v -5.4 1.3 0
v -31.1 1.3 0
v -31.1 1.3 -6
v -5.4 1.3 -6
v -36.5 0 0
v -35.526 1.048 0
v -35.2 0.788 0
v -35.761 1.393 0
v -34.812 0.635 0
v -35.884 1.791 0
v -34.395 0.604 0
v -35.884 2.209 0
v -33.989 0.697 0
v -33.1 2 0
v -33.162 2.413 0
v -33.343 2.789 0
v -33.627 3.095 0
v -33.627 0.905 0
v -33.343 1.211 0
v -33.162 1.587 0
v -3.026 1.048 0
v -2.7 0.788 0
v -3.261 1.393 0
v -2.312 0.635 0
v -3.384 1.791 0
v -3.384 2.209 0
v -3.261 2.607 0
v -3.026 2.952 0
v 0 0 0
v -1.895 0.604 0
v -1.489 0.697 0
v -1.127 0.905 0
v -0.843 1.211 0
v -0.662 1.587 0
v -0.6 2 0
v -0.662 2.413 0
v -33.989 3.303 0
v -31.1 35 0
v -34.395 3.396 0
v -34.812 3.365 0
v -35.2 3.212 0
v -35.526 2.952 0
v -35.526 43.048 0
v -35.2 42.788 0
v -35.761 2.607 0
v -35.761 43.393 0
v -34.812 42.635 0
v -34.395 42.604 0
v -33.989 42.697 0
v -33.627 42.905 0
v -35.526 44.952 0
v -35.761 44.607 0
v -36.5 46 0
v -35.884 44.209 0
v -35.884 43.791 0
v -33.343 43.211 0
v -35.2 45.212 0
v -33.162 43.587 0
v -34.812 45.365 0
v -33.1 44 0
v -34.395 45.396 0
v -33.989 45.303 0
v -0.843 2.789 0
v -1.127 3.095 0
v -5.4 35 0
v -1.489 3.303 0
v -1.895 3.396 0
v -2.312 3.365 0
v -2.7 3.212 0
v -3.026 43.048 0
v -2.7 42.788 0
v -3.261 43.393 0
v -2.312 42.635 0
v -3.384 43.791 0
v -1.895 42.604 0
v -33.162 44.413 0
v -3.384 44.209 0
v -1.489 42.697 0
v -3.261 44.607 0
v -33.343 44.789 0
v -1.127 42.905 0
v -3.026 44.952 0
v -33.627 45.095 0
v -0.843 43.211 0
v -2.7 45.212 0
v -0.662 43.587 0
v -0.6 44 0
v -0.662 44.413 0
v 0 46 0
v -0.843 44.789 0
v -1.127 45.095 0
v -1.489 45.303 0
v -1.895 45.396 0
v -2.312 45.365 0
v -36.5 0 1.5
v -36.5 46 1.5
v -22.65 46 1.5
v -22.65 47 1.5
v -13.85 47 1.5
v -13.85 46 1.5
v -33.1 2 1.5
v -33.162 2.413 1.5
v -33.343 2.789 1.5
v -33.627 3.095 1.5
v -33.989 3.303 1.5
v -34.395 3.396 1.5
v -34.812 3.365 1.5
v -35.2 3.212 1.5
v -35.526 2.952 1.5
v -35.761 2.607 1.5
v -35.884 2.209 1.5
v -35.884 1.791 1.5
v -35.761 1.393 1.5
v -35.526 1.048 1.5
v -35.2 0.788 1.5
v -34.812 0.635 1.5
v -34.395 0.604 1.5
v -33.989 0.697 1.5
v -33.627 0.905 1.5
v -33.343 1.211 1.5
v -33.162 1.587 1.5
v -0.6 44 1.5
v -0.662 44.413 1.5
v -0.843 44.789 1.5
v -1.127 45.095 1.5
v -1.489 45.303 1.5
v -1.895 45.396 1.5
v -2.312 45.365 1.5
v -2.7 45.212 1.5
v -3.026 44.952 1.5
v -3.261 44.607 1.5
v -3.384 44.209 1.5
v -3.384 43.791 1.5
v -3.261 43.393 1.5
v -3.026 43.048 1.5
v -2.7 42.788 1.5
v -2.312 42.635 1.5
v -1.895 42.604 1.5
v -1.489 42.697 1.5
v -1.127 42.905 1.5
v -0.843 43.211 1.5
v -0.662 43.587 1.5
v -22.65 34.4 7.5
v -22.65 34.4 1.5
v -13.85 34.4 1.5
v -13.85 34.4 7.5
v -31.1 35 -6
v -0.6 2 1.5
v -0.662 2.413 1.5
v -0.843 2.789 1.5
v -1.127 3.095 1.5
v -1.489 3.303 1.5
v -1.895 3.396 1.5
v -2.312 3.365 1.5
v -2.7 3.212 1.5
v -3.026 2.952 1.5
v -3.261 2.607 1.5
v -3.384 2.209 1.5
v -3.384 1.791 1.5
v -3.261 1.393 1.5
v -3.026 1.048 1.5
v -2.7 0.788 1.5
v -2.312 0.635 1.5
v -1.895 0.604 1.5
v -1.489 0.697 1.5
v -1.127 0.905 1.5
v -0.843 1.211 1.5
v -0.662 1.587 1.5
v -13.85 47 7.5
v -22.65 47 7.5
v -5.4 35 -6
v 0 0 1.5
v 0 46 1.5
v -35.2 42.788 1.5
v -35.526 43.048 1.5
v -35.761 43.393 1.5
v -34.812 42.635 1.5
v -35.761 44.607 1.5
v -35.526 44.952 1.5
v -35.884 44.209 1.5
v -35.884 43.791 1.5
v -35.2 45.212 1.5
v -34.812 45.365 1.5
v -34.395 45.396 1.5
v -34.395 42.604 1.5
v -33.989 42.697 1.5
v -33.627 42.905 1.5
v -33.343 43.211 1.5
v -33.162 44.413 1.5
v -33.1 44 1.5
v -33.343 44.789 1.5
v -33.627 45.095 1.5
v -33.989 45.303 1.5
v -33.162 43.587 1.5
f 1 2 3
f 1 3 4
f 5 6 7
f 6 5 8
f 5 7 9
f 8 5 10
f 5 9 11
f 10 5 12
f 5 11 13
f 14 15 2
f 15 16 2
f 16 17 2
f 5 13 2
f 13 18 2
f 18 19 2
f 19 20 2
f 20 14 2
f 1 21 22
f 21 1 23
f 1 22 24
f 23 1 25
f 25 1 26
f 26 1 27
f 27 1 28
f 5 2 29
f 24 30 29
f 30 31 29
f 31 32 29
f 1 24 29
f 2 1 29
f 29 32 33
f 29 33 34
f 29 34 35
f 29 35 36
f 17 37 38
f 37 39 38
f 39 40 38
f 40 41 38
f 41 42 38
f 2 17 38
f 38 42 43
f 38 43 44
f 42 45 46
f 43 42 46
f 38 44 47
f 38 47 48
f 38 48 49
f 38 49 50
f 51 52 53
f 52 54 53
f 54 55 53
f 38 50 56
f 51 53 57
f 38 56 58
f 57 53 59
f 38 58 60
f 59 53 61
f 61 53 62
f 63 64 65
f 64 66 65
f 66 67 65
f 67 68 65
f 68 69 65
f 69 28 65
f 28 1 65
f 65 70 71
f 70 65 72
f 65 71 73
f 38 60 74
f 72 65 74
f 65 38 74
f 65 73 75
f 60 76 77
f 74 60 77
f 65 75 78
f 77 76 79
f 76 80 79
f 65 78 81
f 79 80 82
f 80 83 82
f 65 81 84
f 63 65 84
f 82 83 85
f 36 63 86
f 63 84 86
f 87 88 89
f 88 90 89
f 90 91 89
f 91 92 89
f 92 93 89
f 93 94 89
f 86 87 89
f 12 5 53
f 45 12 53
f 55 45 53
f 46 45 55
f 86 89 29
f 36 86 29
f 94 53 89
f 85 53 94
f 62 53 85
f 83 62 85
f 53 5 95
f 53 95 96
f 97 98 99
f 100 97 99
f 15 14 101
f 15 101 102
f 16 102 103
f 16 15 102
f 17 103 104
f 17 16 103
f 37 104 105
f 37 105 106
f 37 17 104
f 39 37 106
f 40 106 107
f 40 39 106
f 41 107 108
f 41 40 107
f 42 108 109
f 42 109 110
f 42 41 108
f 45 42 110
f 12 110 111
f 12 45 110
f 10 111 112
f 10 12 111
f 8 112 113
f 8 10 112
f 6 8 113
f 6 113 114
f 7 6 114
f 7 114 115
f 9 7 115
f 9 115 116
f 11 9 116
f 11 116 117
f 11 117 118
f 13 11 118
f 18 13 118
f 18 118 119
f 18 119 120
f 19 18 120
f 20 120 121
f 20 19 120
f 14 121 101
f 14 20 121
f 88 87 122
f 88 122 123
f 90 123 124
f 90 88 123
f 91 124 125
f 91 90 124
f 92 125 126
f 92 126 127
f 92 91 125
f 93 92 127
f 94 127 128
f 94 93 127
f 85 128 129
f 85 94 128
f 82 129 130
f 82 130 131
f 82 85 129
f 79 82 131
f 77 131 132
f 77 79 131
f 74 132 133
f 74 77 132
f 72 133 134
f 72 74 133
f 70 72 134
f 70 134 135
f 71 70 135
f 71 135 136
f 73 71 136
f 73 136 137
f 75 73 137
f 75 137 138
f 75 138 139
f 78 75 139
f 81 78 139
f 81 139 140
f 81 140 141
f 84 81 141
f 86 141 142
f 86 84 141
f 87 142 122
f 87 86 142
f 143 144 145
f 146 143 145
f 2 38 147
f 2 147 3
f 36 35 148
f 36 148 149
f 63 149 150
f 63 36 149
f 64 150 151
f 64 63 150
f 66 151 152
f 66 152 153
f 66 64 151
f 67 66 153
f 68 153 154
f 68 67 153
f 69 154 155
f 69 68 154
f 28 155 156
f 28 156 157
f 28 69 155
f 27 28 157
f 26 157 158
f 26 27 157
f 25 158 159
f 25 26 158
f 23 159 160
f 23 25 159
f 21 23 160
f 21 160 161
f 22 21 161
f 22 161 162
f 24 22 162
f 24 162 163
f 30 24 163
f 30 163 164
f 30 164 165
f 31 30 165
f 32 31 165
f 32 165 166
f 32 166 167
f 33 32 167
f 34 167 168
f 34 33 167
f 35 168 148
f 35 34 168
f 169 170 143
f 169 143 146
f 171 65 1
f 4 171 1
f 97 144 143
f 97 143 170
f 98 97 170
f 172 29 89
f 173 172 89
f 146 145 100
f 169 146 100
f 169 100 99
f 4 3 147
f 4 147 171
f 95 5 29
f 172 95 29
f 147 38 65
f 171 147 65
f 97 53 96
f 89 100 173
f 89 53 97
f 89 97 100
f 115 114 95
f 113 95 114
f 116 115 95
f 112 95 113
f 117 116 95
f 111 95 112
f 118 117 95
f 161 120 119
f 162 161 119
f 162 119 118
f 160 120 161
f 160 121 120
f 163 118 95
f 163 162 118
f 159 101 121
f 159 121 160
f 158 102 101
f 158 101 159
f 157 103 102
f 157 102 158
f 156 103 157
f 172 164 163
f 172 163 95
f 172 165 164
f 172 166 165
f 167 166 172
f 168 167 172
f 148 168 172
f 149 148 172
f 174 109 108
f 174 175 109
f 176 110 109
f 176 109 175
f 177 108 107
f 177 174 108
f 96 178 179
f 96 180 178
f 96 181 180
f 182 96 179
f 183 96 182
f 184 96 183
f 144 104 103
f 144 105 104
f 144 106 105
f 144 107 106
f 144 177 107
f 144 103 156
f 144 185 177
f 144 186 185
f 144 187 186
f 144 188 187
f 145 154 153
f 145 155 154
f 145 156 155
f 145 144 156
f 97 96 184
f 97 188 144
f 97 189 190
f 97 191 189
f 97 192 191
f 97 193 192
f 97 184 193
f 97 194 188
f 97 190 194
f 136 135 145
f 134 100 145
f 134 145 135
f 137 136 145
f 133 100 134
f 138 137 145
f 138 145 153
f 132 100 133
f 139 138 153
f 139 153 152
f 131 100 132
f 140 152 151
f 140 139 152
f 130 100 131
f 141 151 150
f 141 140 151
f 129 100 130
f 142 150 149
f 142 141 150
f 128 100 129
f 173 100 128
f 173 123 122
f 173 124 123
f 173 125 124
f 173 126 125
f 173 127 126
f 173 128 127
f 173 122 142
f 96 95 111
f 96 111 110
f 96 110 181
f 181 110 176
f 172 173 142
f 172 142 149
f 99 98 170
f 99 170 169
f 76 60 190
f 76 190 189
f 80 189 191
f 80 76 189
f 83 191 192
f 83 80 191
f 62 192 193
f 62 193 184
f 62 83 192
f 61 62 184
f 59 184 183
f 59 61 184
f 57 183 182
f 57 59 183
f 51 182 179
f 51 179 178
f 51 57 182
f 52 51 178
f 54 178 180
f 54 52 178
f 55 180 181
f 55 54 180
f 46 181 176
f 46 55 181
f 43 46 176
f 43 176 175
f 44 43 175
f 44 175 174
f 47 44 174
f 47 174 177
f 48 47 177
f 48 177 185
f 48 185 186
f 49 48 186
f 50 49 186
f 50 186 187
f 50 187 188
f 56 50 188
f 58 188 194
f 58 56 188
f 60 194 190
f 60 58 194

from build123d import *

# Parameters (mm, degrees)
F0_W     = 36.5
F0_H     = 46
F0_R     = 1.4
F1_DEPTH = 1.5
F2_W     = 8.8
F2_H     = 12.6
F3_DEPTH = 6
F4_W     = 25.7
F4_H     = 33.7
F5_DEPTH = 6


with BuildPart() as f1:
    # F0 (on Top) → F1 (new body)
    with BuildSketch(Plane.XY):
        with Locations((-18.25, 23)):
            Rectangle(F0_W, F0_H)
        with Locations((-34.5, 2)):
            Circle(F0_R, mode=Mode.SUBTRACT)
        with Locations((-2, 2)):
            Circle(F0_R, mode=Mode.SUBTRACT)
        with Locations((-34.5, 44)):
            Circle(F0_R, mode=Mode.SUBTRACT)
        with Locations((-2, 44)):
            Circle(F0_R, mode=Mode.SUBTRACT)
    extrude(amount=F1_DEPTH)

    # F2 (on face) → F3 (join)
    with BuildSketch(Plane.XY.offset(1.5)):
        with Locations((-18.25, 40.7)):
            Rectangle(F2_W, F2_H)
    extrude(amount=F3_DEPTH)

    # F4 (on face) → F5 (join)
    with BuildSketch(Plane(origin=(0, 0, 0), x_dir=(1, 0, 0), z_dir=(0, 0, -1))):
        with Locations((-18.25, -18.15)):
            Rectangle(F4_W, F4_H)
    extrude(amount=F5_DEPTH)


solid = f1.part
